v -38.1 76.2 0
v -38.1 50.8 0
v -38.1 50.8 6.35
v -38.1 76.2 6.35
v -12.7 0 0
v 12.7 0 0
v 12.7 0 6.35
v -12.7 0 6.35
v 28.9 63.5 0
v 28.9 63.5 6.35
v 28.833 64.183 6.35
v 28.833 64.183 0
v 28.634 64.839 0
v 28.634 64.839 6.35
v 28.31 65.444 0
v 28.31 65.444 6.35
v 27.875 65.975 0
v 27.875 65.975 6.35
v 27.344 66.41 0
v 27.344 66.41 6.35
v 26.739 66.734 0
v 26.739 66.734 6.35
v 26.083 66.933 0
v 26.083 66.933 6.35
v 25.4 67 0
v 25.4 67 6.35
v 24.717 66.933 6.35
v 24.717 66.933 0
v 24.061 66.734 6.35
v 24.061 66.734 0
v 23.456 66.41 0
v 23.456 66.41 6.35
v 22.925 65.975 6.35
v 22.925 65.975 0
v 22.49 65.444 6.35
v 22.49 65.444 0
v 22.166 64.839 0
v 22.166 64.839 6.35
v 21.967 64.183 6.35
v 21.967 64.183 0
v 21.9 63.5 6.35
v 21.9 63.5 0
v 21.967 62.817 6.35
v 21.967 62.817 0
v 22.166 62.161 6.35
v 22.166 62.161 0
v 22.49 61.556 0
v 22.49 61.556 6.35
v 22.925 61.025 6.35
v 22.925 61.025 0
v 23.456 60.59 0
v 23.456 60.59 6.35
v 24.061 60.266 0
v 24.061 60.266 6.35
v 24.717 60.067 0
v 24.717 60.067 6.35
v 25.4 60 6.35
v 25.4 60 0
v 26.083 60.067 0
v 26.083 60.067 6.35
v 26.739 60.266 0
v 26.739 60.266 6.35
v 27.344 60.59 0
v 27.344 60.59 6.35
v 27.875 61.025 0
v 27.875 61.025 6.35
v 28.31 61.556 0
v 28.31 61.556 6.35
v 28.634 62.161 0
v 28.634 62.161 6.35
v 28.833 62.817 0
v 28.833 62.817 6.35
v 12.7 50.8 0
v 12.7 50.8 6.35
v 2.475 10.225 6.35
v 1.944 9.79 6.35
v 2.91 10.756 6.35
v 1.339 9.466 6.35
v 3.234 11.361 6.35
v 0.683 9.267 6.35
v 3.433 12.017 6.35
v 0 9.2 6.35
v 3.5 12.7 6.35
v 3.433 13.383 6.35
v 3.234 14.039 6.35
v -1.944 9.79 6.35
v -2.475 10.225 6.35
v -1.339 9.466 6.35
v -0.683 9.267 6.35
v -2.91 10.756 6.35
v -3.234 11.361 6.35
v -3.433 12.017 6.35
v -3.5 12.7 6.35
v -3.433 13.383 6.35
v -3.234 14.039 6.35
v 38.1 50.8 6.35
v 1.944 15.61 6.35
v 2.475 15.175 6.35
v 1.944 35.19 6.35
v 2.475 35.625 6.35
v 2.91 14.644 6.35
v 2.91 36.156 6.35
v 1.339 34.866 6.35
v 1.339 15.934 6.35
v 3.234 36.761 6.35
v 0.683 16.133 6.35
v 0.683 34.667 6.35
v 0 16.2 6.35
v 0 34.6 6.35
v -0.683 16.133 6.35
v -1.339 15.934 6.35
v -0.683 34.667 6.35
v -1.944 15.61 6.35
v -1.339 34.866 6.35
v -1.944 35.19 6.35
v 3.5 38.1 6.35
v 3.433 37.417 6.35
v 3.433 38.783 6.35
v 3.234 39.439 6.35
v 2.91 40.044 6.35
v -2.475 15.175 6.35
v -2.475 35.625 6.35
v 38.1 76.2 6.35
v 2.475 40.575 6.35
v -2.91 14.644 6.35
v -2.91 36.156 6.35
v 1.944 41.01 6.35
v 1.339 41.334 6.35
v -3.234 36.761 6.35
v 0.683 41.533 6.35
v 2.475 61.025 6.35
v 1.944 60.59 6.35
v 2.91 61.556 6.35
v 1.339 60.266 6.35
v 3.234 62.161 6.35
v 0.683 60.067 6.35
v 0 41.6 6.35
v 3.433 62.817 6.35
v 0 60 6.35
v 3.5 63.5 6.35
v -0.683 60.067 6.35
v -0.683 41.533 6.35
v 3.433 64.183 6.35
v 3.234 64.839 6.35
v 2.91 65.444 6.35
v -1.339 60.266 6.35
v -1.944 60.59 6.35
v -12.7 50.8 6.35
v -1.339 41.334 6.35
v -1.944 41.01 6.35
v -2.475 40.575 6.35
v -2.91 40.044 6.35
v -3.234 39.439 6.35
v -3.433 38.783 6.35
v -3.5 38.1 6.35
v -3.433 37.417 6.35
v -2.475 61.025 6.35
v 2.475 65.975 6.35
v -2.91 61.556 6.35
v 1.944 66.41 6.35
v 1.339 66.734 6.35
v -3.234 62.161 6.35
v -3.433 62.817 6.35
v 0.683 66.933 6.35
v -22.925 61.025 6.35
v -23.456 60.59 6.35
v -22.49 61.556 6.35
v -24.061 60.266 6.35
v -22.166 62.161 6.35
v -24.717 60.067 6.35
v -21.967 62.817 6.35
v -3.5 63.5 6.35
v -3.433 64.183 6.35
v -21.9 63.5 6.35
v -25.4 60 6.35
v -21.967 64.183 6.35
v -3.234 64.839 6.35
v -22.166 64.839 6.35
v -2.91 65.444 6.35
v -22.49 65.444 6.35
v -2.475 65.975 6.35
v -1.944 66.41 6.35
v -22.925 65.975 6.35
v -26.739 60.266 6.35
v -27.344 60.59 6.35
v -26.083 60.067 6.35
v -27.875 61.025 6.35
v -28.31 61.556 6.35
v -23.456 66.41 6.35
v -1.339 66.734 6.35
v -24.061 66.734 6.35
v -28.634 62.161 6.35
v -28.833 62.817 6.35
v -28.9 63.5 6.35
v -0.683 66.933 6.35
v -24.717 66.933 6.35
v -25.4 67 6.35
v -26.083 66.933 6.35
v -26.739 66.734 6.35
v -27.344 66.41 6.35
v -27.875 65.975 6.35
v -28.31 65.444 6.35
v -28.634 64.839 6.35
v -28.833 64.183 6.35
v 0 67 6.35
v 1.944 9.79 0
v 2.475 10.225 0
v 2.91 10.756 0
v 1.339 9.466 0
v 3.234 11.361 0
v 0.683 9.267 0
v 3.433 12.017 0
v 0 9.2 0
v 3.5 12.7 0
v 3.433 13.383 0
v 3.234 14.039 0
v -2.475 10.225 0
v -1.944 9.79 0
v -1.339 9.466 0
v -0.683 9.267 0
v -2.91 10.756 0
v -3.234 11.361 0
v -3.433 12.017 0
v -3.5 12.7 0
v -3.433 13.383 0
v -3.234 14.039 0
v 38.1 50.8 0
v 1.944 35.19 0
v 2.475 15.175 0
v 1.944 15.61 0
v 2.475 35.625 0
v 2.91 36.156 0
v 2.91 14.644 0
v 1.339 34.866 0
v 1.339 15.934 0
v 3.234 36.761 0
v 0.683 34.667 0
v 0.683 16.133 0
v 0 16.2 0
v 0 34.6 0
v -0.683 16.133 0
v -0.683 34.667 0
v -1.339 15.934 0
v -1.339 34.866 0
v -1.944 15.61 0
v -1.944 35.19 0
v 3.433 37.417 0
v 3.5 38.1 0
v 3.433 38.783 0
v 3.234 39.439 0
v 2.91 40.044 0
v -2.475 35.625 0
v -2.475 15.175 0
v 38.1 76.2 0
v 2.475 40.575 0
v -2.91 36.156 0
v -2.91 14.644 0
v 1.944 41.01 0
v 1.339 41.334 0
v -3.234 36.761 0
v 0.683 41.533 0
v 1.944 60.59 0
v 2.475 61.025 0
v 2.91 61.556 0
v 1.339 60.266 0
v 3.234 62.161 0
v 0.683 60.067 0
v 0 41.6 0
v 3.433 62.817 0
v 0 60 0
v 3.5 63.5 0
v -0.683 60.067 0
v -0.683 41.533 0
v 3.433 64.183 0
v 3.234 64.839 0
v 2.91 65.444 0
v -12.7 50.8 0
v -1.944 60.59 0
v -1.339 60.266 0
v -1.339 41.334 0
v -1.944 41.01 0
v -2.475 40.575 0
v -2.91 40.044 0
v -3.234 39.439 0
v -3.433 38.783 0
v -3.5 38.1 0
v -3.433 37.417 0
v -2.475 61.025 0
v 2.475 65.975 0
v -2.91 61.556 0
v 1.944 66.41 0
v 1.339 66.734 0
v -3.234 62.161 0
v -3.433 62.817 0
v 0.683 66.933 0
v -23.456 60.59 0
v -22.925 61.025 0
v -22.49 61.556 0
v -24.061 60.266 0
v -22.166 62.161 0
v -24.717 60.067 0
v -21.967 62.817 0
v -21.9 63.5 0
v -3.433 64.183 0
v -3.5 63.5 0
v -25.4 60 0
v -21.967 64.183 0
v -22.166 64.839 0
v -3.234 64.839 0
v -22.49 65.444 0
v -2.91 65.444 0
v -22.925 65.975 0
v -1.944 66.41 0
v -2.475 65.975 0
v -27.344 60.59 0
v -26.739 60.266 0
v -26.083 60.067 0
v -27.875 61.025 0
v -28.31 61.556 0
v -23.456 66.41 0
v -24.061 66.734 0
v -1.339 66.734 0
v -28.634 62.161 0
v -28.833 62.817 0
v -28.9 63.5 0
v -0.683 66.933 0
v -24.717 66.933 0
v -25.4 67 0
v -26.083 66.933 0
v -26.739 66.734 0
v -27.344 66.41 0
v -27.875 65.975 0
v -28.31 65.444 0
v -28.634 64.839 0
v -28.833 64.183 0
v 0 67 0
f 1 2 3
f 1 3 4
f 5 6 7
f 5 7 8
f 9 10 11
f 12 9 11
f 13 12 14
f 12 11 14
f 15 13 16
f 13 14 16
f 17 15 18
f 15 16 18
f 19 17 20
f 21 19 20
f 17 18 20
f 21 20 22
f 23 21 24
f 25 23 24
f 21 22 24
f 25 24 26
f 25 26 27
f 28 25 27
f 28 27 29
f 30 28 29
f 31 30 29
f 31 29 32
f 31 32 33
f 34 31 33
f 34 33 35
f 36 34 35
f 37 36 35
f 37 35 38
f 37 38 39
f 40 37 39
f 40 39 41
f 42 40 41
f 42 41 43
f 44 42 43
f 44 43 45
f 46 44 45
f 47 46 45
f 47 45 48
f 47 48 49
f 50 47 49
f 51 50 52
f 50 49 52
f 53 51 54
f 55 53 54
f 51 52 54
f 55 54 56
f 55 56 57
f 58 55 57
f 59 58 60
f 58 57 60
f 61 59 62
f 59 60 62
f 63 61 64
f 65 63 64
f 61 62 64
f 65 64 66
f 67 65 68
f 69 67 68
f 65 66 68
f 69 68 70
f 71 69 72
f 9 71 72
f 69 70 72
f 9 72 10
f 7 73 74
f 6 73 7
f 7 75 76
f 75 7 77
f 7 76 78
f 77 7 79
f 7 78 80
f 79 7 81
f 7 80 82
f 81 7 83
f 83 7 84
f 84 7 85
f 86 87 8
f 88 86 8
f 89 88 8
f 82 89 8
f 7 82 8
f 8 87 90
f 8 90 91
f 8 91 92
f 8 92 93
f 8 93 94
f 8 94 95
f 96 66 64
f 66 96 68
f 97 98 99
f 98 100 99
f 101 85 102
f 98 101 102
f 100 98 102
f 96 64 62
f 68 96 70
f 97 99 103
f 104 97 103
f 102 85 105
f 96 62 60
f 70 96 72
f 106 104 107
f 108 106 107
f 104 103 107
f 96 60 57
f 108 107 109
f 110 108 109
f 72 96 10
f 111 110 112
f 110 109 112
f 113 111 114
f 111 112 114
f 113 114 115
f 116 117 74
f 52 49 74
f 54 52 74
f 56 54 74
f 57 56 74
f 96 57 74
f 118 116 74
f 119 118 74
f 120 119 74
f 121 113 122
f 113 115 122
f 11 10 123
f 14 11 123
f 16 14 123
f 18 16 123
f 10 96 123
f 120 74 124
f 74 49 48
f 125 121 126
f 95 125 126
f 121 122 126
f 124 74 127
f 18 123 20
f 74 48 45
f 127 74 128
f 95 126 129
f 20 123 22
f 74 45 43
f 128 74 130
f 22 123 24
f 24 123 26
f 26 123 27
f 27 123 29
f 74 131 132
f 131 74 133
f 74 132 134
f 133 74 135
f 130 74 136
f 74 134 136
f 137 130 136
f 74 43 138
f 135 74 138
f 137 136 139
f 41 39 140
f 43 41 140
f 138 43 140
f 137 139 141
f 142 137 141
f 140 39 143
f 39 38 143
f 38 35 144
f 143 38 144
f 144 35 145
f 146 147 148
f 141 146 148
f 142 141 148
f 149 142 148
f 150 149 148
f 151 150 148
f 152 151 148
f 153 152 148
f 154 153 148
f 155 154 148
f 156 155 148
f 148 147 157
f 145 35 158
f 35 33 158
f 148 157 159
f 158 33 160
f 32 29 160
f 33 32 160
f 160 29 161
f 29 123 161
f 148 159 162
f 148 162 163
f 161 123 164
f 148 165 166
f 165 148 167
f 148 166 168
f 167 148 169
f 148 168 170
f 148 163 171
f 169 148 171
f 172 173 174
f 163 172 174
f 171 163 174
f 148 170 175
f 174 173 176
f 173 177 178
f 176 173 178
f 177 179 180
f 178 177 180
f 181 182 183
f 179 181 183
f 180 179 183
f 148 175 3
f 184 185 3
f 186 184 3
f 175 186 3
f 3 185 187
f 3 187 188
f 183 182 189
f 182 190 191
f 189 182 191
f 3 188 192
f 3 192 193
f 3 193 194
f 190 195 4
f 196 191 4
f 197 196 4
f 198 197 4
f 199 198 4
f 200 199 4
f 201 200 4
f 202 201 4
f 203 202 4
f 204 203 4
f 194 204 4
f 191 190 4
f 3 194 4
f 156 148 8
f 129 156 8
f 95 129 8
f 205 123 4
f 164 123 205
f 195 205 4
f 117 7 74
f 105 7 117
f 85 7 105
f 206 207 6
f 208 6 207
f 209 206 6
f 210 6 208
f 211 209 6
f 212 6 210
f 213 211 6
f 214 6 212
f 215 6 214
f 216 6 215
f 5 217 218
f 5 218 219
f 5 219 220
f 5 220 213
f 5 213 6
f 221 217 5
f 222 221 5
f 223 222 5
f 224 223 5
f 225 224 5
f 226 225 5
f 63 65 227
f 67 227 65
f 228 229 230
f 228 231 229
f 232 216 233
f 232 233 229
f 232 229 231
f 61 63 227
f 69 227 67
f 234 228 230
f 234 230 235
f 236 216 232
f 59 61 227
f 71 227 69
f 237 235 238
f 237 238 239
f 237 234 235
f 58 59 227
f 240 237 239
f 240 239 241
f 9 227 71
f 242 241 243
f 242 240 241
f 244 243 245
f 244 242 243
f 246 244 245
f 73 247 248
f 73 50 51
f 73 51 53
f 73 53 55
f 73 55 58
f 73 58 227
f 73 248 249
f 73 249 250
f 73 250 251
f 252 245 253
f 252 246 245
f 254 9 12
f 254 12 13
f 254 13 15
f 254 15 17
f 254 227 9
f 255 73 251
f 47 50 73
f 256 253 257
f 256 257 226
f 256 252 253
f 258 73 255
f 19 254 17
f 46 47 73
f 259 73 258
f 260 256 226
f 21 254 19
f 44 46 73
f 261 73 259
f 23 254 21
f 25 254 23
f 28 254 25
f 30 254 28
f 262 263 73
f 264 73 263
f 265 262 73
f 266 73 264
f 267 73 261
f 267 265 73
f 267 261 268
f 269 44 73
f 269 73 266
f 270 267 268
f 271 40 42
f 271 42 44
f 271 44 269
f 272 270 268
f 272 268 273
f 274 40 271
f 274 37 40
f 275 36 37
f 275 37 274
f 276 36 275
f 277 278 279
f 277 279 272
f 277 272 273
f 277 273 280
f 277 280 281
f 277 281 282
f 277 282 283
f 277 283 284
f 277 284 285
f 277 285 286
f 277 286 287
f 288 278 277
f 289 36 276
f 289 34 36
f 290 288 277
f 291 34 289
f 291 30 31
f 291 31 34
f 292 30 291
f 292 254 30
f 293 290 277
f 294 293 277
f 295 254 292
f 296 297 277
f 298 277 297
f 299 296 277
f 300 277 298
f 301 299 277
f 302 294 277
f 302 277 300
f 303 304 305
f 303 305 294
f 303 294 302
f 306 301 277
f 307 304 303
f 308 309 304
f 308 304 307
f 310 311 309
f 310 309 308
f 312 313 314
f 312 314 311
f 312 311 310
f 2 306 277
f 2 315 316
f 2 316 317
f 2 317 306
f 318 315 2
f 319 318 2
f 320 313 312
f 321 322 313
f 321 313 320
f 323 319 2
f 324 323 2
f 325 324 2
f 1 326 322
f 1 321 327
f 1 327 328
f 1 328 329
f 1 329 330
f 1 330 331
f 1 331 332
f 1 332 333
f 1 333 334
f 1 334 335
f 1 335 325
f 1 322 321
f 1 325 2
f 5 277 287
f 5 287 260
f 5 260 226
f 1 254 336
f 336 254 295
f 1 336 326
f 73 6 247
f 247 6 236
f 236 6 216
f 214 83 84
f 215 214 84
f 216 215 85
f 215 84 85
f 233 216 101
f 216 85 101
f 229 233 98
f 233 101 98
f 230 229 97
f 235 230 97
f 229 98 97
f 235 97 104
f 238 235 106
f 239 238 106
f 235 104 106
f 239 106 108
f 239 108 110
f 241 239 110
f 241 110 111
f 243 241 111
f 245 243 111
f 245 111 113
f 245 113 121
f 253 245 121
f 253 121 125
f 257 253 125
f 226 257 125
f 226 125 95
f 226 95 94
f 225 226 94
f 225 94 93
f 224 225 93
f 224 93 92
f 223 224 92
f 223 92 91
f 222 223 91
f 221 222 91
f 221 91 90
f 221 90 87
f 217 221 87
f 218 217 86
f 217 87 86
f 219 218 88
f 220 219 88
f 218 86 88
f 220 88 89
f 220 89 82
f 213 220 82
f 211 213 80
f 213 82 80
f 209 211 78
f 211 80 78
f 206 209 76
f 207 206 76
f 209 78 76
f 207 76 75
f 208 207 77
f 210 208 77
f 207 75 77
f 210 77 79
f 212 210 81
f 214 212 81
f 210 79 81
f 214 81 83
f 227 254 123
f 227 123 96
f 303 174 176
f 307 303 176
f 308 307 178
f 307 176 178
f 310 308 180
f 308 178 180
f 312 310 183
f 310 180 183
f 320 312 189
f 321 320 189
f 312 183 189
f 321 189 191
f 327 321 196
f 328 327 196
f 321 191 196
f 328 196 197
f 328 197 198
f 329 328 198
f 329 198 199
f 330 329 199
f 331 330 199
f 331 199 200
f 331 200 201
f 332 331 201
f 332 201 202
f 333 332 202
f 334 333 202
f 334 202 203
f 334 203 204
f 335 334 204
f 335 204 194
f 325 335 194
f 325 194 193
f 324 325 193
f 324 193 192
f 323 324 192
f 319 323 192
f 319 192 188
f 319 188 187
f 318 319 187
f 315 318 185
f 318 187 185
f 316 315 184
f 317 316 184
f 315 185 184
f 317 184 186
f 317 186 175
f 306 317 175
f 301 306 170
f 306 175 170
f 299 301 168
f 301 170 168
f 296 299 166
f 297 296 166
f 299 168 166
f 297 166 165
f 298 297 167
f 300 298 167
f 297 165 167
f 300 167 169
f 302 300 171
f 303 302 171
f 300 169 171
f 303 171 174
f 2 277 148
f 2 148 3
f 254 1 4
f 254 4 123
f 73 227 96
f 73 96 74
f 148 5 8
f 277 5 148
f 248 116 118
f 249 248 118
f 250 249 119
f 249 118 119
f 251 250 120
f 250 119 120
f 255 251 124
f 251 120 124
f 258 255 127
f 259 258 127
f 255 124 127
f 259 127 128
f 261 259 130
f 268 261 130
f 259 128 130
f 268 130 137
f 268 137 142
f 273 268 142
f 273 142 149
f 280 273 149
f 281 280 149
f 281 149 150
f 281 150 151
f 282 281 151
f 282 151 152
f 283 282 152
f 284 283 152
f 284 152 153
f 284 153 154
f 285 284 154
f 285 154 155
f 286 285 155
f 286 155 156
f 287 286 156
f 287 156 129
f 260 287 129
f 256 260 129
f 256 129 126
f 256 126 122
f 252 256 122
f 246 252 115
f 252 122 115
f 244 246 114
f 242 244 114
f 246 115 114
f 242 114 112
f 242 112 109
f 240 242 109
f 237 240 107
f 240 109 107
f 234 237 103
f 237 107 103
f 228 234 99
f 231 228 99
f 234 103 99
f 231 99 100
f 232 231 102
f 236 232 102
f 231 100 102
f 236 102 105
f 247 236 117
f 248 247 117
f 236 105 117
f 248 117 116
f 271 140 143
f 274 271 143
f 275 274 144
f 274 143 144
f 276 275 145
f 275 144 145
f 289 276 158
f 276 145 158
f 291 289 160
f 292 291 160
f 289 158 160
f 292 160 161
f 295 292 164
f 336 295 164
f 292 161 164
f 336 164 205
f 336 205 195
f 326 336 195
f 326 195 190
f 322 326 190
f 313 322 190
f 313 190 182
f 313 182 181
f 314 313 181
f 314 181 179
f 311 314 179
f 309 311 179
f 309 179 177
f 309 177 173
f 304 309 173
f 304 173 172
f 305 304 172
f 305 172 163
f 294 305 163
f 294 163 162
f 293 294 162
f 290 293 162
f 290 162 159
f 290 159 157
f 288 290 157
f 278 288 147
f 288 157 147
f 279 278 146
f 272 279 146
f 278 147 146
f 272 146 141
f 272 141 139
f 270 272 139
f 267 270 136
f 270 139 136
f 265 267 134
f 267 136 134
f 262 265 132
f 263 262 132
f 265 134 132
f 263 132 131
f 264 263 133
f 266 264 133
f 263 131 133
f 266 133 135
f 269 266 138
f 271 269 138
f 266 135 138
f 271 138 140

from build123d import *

# Parameters (mm, degrees)
BOSS_EXTRUDE1_DEPTH = 6.35
SKETCH2_R           = 3.5
CUT_EXTRUDE1_DEPTH  = 7.35


with BuildPart() as part:
    # Sketch1 → Boss-Extrude1 (new body)
    with BuildSketch(Plane.XY):
        Polygon((12.7, 0), (-12.7, 0), (-12.7, 50.8), (-38.1, 50.8), (-38.1, 76.2), (38.1, 76.2), (38.1, 50.8), (12.7, 50.8), align=None)
    extrude(amount=BOSS_EXTRUDE1_DEPTH)

    # Sketch2 → Cut-Extrude1 (cut, through all)
    with BuildSketch(Plane.XY.offset(6.35)):
        with Locations((0, 63.5)):
            Circle(SKETCH2_R)
        with Locations((25.4, 63.5)):
            Circle(SKETCH2_R)
        with Locations((-25.4, 63.5)):
            Circle(SKETCH2_R)
        with Locations((0, 38.1)):
            Circle(SKETCH2_R)
        with Locations((0, 12.7)):
            Circle(SKETCH2_R)
    extrude(amount=-CUT_EXTRUDE1_DEPTH, mode=Mode.SUBTRACT)


solid = part.part
